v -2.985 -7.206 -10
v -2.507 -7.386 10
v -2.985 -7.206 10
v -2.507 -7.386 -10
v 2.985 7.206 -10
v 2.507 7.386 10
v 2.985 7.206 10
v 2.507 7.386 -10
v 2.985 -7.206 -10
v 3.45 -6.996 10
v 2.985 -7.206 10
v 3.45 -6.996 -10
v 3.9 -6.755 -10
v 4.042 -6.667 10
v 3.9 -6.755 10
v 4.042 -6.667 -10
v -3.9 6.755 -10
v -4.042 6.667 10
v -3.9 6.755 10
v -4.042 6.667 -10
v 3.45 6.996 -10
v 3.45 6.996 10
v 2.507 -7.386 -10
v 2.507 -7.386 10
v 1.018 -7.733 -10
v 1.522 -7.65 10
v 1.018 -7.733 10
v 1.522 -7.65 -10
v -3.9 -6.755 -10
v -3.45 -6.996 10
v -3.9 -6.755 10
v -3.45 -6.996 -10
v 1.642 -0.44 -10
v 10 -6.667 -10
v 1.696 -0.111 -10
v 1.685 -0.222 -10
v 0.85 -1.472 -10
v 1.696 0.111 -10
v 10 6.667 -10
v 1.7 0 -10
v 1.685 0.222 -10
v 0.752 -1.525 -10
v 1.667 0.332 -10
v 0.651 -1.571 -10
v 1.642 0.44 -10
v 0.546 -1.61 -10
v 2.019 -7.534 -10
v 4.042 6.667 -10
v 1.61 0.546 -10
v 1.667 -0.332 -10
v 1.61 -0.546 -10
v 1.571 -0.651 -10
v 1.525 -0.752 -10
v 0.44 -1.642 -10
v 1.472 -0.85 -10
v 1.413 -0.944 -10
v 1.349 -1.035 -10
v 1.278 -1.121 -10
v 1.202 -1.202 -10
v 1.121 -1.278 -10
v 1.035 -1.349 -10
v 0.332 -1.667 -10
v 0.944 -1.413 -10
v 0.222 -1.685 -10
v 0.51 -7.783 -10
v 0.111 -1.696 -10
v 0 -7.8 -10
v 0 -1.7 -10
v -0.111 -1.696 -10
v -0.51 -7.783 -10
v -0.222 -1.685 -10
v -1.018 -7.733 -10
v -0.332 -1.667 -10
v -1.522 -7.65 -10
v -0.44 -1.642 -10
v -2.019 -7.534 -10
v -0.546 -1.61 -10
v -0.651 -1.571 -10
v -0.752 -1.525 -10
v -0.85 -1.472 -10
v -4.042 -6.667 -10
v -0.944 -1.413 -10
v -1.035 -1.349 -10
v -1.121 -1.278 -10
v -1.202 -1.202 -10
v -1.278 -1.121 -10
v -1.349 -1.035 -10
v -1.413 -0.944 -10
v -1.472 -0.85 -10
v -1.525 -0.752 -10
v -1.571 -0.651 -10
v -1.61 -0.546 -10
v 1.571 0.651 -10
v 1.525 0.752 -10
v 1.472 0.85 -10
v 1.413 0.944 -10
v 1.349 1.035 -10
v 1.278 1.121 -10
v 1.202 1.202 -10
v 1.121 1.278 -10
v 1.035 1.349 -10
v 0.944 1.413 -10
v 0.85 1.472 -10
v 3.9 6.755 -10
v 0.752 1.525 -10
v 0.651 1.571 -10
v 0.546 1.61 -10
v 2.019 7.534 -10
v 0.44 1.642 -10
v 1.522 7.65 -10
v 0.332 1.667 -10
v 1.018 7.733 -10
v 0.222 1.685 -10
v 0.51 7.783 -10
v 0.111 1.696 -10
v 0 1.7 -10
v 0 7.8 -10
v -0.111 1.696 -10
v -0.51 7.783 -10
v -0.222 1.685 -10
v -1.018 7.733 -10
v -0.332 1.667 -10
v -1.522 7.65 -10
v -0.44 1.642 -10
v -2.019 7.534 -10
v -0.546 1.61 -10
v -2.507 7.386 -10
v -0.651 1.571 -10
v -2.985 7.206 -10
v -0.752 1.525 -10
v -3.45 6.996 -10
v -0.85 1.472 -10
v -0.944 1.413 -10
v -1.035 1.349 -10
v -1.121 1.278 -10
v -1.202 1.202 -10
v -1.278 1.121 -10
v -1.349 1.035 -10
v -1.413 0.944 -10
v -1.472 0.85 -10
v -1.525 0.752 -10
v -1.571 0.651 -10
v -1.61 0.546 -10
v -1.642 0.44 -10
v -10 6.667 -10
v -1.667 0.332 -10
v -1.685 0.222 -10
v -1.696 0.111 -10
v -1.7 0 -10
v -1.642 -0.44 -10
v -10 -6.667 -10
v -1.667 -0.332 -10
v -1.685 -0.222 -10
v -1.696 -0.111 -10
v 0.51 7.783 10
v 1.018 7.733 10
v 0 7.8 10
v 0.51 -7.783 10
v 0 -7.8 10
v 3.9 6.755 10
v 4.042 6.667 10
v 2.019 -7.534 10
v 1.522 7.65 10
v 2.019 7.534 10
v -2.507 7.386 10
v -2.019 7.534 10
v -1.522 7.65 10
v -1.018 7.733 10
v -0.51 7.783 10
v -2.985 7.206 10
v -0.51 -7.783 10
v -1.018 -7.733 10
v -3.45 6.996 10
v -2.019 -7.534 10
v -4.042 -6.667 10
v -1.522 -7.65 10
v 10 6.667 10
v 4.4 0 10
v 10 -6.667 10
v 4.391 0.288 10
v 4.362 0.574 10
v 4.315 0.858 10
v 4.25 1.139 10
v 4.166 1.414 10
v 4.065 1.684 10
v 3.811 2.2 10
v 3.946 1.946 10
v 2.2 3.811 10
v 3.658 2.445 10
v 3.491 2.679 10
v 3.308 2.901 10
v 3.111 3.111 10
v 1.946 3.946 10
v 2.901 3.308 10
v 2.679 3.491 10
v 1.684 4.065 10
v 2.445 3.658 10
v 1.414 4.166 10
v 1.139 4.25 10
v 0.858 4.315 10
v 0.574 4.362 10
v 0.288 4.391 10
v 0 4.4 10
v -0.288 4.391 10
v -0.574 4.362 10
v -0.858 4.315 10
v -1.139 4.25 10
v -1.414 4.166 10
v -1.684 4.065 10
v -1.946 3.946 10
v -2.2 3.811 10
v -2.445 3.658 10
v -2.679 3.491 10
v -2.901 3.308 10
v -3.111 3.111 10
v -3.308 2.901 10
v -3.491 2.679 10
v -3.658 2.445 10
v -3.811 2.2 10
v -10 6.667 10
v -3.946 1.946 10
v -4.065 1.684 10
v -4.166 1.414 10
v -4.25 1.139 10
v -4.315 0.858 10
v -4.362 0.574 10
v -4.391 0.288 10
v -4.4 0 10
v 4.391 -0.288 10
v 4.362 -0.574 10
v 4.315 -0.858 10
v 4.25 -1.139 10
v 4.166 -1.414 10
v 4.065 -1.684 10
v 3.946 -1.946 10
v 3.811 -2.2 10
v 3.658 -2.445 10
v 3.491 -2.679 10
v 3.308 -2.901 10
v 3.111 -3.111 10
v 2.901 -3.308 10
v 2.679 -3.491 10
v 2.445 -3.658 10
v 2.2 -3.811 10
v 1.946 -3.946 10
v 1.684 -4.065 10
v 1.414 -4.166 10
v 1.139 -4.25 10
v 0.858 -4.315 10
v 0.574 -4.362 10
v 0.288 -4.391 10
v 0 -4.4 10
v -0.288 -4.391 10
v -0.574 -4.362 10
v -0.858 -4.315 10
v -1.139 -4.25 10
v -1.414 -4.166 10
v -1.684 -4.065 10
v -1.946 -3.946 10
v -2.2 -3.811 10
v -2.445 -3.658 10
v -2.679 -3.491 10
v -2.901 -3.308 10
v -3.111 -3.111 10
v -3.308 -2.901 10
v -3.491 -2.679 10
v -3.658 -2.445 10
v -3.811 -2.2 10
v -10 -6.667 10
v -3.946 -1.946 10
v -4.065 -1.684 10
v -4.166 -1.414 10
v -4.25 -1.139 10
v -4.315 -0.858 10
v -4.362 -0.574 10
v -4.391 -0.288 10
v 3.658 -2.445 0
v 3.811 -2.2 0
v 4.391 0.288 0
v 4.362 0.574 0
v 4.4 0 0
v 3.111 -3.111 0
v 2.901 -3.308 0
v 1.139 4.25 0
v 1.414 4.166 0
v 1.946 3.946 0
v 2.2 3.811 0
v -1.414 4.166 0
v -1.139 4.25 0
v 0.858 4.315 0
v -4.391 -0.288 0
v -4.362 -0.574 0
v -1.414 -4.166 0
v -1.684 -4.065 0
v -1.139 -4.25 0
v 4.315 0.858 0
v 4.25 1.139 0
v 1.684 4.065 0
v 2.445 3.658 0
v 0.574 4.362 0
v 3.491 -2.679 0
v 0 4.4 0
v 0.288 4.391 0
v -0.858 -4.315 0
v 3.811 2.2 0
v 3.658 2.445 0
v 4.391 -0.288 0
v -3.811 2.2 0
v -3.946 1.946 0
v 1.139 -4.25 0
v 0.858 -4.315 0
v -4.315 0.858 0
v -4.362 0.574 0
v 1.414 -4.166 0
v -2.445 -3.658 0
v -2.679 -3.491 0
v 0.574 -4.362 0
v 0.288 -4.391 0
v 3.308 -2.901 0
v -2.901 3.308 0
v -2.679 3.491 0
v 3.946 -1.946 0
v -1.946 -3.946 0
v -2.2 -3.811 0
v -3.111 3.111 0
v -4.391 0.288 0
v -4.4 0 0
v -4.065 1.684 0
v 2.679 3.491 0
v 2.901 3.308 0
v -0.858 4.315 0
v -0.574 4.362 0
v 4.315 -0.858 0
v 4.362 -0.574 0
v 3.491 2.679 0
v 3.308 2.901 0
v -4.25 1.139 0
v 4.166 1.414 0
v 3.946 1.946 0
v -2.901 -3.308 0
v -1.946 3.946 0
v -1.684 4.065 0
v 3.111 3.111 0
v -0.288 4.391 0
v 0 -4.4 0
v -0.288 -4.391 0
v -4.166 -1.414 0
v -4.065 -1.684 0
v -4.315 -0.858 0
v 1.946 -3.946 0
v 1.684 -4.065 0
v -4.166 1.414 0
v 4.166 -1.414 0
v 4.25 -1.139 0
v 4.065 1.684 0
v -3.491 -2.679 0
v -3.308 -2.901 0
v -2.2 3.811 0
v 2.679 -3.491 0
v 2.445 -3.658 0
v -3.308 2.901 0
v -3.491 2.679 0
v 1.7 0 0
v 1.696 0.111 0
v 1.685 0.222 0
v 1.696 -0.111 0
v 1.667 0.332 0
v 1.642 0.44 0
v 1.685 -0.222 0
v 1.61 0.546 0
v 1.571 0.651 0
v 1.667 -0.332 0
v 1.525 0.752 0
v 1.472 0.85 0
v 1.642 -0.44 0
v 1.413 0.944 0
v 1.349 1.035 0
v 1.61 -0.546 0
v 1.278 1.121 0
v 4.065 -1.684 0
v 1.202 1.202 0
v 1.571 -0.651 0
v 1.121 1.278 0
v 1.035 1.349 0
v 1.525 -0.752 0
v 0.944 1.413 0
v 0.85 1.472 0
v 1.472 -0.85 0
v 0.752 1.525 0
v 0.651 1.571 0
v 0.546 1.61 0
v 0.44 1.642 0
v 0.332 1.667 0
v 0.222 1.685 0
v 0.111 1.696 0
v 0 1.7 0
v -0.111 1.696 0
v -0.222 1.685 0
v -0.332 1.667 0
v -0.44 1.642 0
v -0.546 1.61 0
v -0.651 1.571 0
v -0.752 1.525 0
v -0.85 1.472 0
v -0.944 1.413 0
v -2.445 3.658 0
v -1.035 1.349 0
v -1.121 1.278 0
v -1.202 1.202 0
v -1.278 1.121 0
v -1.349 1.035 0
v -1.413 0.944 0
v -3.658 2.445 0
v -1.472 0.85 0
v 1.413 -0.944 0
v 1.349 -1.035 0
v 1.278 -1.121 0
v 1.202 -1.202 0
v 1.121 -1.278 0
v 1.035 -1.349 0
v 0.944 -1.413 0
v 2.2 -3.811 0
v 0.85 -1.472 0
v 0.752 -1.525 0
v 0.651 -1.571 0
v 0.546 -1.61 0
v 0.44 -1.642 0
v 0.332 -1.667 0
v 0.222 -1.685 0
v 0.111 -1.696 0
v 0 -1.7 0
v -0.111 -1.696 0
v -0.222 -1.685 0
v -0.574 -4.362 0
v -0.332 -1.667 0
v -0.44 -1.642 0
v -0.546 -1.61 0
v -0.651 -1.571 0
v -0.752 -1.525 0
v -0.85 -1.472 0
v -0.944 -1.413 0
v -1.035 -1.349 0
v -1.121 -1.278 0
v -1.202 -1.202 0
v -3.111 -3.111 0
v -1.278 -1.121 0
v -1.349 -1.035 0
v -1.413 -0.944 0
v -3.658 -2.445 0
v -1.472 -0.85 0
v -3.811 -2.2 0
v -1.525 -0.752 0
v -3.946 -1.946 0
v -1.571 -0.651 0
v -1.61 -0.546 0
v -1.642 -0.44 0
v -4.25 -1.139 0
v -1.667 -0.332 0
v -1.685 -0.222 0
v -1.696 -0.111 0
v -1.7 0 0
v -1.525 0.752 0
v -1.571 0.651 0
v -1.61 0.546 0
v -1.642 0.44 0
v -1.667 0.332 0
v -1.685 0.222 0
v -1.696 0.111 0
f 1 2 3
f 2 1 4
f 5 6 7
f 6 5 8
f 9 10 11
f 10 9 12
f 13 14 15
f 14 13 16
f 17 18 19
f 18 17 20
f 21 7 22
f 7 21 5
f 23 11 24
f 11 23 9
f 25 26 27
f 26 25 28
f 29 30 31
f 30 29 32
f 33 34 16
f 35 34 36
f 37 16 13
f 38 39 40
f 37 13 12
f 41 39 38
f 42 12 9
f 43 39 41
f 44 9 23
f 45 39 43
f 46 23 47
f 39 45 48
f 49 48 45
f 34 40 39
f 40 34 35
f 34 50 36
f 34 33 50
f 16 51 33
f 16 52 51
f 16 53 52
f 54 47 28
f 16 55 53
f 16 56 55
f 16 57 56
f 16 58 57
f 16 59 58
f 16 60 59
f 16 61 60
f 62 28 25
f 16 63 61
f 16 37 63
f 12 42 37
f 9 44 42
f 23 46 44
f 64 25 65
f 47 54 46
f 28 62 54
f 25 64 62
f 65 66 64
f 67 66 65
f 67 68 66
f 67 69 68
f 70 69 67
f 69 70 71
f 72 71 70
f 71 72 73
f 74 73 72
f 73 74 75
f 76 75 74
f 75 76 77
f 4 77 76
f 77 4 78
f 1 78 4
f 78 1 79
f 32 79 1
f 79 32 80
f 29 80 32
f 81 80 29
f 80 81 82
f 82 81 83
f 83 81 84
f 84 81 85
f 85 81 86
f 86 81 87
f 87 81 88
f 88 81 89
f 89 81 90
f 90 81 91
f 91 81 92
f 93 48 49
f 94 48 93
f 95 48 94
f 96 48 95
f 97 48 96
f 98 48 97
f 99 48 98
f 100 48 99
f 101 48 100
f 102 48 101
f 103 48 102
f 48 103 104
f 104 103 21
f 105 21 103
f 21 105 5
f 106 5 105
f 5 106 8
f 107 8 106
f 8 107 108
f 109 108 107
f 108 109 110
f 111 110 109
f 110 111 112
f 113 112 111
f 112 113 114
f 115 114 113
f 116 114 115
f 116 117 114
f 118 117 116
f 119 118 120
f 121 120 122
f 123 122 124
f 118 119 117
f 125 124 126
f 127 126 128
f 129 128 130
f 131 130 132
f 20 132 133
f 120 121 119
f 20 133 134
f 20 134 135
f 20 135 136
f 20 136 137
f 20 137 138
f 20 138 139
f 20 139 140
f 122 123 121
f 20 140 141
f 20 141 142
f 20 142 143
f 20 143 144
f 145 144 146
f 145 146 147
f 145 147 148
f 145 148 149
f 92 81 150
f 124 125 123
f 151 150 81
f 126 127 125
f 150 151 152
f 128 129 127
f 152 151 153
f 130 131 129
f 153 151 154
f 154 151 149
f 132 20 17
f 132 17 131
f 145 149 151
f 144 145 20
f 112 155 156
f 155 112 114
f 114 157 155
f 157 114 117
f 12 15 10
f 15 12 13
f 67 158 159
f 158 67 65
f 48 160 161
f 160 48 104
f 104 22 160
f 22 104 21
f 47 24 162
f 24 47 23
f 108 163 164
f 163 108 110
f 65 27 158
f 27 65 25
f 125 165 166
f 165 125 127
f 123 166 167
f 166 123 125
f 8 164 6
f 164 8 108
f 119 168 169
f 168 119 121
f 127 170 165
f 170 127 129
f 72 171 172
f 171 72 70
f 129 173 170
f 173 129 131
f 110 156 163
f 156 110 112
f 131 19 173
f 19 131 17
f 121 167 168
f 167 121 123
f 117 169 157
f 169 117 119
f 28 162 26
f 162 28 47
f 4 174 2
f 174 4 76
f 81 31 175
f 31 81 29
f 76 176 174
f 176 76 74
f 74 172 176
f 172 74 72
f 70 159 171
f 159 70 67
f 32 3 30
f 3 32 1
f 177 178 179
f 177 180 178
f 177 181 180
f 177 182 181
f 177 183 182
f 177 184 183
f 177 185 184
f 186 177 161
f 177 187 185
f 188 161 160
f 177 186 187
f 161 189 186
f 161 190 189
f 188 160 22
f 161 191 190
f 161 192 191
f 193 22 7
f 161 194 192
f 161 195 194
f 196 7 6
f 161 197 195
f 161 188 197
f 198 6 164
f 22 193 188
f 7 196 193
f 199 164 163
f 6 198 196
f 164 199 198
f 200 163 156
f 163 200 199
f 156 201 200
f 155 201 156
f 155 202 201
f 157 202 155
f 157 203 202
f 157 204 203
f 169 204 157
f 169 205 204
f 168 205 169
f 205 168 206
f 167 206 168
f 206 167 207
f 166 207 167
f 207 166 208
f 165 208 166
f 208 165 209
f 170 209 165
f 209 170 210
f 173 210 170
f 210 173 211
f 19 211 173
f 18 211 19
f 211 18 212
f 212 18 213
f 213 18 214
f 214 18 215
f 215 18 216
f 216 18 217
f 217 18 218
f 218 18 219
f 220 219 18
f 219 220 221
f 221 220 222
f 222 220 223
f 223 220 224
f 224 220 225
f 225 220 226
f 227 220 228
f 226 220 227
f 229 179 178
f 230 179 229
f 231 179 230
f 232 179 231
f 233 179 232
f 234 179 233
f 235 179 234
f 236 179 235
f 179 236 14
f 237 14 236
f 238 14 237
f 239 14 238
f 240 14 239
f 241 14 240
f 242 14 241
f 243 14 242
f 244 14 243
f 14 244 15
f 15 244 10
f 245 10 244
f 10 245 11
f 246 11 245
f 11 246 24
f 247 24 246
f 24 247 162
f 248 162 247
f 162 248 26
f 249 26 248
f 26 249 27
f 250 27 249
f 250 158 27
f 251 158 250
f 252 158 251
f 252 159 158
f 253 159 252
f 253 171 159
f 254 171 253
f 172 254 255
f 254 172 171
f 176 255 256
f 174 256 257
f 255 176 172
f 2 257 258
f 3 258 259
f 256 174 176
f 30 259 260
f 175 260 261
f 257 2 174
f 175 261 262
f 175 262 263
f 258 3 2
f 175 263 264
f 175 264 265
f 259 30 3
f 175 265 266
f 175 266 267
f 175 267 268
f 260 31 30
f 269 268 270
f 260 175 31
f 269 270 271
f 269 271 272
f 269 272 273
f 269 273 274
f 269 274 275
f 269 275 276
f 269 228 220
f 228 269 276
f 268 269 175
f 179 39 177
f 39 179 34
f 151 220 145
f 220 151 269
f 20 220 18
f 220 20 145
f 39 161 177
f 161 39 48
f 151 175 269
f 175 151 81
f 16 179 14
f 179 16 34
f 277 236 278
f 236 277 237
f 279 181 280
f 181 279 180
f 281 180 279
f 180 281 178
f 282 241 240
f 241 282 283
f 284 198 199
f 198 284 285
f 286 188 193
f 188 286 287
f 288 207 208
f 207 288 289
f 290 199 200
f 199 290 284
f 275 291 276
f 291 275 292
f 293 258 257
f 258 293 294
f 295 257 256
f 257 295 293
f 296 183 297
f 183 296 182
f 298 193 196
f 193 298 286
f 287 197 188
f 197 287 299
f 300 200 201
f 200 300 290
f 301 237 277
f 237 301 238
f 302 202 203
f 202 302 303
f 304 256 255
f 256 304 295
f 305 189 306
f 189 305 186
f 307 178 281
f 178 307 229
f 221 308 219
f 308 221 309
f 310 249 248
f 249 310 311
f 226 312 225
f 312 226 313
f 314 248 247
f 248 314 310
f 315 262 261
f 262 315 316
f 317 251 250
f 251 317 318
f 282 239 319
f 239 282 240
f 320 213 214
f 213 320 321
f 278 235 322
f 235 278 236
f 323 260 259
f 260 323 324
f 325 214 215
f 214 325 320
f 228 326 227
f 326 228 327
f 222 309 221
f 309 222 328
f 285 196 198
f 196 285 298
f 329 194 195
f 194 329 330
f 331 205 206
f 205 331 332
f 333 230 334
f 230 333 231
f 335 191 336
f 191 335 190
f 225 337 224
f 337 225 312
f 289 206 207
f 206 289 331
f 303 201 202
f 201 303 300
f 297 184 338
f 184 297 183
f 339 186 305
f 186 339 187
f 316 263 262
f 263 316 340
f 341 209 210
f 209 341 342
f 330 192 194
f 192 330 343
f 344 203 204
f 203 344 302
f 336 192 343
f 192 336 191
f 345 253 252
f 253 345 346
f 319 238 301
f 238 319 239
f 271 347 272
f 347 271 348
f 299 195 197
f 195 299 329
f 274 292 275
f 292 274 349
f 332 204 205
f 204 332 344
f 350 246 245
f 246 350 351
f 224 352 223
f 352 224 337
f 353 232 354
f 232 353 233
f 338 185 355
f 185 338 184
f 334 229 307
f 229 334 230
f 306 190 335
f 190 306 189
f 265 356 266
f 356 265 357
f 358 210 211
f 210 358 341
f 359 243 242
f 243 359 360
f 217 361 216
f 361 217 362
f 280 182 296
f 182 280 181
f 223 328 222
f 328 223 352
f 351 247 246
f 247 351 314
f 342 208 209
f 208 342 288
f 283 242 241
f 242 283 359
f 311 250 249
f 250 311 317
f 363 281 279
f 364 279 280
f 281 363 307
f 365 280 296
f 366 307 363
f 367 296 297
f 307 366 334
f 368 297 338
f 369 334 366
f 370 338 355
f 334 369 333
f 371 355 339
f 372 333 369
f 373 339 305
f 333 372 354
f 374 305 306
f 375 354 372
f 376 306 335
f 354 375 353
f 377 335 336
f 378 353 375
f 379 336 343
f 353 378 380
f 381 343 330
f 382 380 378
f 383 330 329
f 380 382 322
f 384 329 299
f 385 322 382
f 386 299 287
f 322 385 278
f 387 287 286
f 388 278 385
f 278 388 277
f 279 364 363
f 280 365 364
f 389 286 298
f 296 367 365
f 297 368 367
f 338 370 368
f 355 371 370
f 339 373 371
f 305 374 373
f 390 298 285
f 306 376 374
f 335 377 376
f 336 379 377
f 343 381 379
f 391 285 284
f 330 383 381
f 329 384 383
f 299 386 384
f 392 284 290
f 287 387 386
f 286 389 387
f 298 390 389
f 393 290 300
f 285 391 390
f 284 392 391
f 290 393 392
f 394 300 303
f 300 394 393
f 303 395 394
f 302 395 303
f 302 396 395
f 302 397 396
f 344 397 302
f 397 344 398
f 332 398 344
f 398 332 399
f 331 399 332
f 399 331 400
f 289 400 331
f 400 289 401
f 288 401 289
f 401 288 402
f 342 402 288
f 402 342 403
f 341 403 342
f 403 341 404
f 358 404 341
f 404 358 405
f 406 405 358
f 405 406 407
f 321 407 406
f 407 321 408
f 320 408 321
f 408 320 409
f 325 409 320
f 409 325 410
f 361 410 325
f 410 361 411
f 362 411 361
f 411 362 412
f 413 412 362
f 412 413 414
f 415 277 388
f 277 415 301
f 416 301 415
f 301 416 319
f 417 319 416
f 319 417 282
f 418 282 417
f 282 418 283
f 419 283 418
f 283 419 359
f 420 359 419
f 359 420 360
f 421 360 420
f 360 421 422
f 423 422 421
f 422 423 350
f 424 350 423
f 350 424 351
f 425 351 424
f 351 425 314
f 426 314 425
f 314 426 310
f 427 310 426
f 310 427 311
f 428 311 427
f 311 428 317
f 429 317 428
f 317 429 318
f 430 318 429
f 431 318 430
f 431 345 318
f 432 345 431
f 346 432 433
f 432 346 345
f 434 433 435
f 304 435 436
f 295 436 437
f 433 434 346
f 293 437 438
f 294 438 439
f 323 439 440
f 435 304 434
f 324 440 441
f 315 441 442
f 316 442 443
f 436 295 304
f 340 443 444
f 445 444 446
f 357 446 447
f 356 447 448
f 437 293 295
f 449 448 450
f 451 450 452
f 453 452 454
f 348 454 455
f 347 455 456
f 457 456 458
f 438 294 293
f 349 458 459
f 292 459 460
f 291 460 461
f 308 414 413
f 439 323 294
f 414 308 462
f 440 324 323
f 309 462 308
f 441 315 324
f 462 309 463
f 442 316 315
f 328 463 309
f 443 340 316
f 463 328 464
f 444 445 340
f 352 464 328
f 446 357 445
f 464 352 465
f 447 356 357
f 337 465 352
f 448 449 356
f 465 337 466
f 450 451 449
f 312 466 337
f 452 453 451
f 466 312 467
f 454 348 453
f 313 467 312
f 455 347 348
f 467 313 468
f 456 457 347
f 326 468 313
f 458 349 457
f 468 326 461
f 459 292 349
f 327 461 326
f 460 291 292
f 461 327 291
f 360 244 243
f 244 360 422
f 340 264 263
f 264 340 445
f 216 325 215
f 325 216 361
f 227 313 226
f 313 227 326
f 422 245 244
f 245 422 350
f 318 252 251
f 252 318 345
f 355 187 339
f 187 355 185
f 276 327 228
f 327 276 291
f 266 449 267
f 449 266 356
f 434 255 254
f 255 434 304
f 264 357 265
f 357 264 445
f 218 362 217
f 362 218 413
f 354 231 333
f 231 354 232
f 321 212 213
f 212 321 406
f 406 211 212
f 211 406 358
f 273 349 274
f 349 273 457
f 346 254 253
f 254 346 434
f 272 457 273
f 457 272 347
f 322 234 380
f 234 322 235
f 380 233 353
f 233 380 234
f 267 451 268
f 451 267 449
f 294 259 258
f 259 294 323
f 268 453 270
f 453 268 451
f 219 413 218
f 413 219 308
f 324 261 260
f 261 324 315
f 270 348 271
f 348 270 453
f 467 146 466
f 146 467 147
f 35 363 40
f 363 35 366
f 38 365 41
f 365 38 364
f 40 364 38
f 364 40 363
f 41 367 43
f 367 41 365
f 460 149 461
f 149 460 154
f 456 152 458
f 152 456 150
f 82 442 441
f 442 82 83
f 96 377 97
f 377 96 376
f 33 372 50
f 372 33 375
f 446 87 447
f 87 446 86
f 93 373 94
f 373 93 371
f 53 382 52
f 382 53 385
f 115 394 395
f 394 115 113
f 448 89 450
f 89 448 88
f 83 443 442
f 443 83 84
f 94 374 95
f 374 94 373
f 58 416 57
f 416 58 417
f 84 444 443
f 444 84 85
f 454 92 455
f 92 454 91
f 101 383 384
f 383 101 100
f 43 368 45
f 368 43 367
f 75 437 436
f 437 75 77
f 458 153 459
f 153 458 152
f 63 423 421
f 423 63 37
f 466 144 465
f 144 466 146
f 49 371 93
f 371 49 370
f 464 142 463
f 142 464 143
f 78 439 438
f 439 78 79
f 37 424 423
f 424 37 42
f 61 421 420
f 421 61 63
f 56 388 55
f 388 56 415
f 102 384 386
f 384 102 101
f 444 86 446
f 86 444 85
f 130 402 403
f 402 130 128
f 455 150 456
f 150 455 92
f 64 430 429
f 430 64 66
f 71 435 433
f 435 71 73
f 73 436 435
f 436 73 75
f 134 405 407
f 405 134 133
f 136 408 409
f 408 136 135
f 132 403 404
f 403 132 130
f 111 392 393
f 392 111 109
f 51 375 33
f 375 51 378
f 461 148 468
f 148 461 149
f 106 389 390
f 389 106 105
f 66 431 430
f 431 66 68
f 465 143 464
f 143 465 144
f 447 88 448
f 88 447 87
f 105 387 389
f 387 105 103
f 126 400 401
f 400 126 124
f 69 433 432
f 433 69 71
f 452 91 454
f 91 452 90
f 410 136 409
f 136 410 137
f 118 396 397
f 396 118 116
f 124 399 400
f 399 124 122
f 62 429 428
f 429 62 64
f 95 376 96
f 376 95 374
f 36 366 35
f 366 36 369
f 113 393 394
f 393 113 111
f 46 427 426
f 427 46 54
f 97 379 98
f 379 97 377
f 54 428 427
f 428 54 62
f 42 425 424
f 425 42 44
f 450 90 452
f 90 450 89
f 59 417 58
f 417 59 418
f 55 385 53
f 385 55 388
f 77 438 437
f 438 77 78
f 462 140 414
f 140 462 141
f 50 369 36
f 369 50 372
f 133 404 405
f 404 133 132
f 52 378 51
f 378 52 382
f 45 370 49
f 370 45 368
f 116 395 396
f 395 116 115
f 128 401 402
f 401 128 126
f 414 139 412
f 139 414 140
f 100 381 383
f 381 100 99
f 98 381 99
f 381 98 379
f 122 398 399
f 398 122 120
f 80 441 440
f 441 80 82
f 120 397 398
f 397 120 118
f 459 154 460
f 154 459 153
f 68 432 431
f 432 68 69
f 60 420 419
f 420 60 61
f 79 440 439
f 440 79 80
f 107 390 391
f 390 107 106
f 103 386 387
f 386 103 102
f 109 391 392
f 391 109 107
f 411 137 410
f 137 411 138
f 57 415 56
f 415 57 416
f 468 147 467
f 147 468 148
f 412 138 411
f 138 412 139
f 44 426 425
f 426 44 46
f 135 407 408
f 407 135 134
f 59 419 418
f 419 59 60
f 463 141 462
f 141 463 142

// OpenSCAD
DowelDiameter = 7.8;
DrillDiameter = 2.4;
FitBuffer = 0.5;
OverallHeight = 20;
rad1 = (DowelDiameter/2)+FitBuffer;
rad2 = (DrillDiameter/2)+FitBuffer;
$fn=96;
difference(){
    union(){
        cylinder(OverallHeight,DowelDiameter,DowelDiameter,true);
        cube([OverallHeight,OverallHeight/1.5,OverallHeight],true);
    }
    union(){
        cylinder(OverallHeight/1.99,rad1,rad1);
        translate([0,0,-(OverallHeight/2)])
            cylinder(OverallHeight/1.99,rad2,rad2);   
    }
}
